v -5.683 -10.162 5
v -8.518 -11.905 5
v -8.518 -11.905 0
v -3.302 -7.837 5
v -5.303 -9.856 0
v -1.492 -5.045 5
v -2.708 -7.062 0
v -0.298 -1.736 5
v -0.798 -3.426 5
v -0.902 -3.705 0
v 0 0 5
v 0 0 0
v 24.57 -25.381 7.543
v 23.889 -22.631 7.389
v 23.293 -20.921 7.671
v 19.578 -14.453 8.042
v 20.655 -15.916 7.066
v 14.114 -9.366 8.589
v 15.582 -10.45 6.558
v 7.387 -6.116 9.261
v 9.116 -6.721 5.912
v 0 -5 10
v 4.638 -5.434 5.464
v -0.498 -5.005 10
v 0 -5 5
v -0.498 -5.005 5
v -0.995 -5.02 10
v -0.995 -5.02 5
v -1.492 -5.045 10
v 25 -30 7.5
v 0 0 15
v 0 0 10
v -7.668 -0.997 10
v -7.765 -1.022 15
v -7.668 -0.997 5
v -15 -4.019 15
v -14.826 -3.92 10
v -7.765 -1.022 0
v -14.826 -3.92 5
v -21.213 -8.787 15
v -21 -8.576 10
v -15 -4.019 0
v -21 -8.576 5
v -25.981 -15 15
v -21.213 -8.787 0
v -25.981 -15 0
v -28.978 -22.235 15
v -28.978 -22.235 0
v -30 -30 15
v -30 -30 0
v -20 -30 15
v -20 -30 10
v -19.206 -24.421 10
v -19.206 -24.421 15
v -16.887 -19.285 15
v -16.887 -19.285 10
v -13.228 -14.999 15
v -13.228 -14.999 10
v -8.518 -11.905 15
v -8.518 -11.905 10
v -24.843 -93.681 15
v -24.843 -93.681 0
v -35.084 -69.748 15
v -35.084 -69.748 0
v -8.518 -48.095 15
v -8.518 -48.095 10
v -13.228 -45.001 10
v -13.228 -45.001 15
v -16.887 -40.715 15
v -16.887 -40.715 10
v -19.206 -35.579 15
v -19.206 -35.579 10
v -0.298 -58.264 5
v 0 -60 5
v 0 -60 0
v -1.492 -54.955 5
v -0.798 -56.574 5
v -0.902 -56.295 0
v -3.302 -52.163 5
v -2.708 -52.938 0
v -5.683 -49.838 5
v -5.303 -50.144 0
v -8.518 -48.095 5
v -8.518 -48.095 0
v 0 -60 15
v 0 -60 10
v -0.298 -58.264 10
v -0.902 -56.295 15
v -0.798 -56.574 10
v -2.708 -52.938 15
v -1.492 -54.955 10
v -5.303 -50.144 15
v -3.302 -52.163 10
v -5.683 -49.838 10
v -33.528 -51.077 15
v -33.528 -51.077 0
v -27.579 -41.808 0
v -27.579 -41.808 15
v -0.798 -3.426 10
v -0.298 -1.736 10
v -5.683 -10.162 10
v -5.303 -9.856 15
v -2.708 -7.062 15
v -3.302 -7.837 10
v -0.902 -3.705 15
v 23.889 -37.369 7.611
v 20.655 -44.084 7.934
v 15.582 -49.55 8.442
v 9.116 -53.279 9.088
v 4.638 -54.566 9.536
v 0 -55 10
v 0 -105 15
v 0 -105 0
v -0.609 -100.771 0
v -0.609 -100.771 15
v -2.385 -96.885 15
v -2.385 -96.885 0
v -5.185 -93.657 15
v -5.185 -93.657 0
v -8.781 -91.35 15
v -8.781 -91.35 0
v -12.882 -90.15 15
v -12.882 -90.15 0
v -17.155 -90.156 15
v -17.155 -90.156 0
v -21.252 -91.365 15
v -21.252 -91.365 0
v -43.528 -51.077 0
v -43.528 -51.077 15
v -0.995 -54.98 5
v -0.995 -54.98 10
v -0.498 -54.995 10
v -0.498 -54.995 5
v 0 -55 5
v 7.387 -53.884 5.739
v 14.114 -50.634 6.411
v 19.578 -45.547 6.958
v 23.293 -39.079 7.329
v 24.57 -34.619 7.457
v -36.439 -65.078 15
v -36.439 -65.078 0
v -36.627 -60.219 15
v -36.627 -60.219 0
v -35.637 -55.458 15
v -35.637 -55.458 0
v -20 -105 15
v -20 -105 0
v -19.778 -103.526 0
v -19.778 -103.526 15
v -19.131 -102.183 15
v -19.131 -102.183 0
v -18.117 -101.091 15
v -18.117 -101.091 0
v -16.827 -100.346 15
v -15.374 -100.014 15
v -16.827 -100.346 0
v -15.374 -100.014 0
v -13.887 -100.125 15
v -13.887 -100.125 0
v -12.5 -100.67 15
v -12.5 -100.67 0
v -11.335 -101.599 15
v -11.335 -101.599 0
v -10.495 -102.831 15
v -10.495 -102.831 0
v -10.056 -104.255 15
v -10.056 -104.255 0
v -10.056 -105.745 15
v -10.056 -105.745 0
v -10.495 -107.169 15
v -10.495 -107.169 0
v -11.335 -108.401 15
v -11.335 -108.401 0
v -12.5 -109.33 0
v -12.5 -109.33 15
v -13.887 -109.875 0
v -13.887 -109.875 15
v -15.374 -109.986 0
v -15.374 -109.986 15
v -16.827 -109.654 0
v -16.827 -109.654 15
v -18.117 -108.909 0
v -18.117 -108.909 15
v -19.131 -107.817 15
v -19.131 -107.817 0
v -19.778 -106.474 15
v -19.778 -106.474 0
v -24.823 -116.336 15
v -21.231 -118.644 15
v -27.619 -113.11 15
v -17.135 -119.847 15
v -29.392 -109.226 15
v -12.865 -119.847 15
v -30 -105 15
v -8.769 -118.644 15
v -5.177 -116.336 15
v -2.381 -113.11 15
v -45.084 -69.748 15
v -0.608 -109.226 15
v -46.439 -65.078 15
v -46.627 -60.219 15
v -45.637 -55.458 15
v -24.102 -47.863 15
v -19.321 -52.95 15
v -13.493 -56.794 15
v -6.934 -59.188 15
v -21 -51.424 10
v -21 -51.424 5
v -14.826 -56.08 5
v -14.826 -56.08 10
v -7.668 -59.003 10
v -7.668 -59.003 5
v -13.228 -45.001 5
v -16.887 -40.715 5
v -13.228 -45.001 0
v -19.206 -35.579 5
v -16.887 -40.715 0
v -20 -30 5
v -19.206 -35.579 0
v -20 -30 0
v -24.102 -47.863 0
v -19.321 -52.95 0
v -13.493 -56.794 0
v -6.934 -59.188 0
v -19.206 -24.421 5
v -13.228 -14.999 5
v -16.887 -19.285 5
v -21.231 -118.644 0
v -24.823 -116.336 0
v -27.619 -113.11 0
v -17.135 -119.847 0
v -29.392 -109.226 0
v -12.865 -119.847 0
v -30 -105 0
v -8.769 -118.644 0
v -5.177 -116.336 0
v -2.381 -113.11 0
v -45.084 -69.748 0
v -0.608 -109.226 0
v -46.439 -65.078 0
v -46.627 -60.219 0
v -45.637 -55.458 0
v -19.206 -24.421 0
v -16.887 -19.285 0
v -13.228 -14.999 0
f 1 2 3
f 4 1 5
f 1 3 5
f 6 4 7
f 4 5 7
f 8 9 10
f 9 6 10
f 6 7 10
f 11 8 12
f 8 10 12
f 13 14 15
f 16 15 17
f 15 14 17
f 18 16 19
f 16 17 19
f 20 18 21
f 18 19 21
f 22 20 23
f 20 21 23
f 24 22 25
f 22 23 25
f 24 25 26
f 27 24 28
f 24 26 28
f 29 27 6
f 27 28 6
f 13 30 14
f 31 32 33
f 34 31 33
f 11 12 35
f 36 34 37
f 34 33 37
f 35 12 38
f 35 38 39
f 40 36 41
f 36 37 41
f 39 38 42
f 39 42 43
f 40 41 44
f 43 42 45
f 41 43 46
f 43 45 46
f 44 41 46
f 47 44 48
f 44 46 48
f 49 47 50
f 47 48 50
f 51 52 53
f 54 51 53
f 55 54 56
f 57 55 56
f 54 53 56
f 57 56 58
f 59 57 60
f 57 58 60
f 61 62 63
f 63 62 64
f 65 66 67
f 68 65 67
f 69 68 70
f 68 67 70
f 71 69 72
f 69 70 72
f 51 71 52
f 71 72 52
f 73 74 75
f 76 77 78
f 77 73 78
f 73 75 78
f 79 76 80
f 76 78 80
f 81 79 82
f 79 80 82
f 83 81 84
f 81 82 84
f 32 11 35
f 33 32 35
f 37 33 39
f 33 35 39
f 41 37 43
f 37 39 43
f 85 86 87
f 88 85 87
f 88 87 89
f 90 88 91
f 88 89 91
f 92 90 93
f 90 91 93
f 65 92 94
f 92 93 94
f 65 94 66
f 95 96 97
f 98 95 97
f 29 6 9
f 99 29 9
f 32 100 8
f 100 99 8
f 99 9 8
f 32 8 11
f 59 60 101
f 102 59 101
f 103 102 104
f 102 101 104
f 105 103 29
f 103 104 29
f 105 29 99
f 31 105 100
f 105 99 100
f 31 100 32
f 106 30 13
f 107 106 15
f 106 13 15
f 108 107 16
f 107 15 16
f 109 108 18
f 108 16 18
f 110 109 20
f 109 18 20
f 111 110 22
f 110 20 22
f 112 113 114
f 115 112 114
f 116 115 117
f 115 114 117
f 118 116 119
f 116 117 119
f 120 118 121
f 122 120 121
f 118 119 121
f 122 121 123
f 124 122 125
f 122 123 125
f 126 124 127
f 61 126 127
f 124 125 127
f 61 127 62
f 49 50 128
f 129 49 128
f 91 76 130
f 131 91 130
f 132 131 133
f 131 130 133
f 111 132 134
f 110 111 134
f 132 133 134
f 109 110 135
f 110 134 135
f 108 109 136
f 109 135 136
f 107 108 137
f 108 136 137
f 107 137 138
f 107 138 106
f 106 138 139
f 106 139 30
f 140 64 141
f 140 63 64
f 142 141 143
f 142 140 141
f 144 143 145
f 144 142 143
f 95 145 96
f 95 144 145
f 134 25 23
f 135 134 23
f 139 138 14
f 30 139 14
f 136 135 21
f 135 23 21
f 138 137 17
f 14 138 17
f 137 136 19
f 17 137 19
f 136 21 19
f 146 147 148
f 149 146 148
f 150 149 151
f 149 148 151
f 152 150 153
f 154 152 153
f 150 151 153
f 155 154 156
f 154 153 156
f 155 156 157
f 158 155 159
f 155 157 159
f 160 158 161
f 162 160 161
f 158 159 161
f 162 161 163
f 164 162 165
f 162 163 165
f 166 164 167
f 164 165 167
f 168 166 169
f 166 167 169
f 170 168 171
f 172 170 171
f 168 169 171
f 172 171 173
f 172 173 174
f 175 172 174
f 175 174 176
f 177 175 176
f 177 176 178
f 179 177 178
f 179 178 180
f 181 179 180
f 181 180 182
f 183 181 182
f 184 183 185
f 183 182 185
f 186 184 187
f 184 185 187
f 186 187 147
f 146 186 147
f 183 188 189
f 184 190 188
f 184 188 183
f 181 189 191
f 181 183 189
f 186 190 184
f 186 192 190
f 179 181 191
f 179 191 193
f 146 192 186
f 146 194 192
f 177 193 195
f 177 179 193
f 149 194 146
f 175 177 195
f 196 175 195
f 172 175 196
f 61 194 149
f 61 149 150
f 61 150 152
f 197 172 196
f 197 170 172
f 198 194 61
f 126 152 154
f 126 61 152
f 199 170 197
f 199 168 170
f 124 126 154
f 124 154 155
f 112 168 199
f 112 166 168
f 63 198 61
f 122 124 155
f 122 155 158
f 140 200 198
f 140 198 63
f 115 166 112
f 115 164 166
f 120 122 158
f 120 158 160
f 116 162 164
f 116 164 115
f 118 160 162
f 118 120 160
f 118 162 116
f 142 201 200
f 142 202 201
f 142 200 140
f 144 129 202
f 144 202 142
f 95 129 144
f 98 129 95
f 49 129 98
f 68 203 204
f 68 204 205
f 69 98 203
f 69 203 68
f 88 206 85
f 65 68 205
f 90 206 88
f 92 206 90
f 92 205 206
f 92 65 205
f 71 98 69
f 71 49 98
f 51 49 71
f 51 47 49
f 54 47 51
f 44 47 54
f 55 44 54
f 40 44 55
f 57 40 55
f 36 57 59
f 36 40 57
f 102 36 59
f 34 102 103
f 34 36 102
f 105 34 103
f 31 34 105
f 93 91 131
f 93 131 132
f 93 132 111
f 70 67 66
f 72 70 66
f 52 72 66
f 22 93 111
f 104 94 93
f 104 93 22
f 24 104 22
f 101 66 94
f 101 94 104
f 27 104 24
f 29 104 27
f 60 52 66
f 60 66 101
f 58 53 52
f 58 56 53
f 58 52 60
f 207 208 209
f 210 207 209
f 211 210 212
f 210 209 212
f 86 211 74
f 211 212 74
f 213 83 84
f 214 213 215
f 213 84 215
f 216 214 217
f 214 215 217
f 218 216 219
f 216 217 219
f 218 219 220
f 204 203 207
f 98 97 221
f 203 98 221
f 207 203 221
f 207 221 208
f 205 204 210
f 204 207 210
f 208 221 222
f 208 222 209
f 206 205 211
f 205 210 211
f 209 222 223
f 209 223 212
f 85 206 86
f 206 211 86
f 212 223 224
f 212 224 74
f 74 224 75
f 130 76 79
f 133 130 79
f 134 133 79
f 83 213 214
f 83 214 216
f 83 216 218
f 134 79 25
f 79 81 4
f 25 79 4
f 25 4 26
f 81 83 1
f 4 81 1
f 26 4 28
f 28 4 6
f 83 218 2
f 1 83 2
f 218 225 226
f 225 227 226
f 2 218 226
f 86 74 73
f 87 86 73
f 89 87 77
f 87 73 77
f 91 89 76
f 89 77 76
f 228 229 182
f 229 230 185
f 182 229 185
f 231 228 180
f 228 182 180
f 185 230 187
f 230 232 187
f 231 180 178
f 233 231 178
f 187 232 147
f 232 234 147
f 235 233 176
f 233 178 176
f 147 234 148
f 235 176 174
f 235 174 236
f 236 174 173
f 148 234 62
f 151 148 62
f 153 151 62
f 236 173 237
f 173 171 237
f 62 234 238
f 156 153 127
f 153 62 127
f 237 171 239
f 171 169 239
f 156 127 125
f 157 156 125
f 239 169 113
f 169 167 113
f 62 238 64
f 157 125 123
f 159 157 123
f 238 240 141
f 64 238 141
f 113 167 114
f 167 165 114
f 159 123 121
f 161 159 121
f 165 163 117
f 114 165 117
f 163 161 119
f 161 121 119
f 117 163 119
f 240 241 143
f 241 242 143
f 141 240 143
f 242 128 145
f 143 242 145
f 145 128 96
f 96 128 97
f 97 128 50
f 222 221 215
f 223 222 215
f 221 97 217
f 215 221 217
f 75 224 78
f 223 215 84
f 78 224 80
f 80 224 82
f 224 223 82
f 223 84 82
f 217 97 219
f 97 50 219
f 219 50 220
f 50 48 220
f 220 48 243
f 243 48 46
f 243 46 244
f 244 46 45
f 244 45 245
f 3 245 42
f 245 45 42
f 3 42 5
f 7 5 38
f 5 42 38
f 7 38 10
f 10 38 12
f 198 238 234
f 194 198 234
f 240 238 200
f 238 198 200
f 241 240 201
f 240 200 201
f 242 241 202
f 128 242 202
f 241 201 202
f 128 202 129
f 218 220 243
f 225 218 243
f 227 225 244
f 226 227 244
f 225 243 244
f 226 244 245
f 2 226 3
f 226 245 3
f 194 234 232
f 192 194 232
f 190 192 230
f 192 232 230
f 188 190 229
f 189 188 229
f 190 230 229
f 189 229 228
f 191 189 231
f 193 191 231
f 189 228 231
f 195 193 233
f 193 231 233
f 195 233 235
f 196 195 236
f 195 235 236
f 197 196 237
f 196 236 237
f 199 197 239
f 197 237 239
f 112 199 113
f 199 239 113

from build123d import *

# Parameters (mm, degrees)
BOSS_EXTRUDE1_DEPTH      = 15
FILLET1_R                = 20
FILLET2_R                = 15
BOSS_EXTRUDE2_DEPTH      = 25
BOSS_EXTRUDE2_DEPTH_BACK = 21
SKETCH2_W                = 5
SKETCH2_H                = 60
CUT_EXTRUDE1_DEPTH       = 5
CUT_EXTRUDE2_DEPTH       = 62


with BuildPart() as part:
    # Sketch1 → Boss-Extrude1 (new body)
    # profile 1 of 6: a face of its own
    with BuildSketch(Plane.XY):
        with BuildLine():
            Line((-20, -30), (-30, -30))
            ThreePointArc((-30, -30), (-29.388396861, -36.026784376), (-27.578524672, -41.807835403))
            Line((-27.578524672, -41.807835403), (-20, -30))
        make_face()
    # profile 2 of 6: a face of its own
    with BuildSketch(Plane.XY):
        with BuildLine():
            Line((0, -10), (0, 0))
            ThreePointArc((0, 0), (-21.213203436, -8.786796564), (-30, -30))
            Line((-30, -30), (-20, -30))
            ThreePointArc((-20, -30), (-14.142135624, -15.857864376), (0, -10))
        make_face()
    # profile 3 of 6: a face of its own
    with BuildSketch(Plane.XY):
        with BuildLine():
            ThreePointArc((0, -50), (-14.142135624, -44.142135624), (-20, -30))
            Line((-20, -30), (-27.578524672, -41.807835403))
            ThreePointArc((-27.578524672, -41.807835403), (-16.519154608, -55.04231481), (0, -60))
            Line((0, -60), (0, -50))
        make_face()
    # profile 4 of 6: a face of its own
    with BuildSketch(Plane.XY):
        with BuildLine():
            ThreePointArc((-27.578524672, -41.807835403), (-29.388396861, -36.026784376), (-30, -30))
            Line((-30, -30), (-49.254650189, -60))
            Line((-49.254650189, -60), (-30, -105))
            ThreePointArc((-30, -105), (-28.650020621, -98.780921528), (-24.84307506, -93.681260081))
            Line((-24.84307506, -93.681260081), (-39.254650189, -60))
            Line((-39.254650189, -60), (-27.578524672, -41.807835403))
        make_face()
    # profile 5 of 6: a face of its own
    with BuildSketch(Plane.XY):
        with BuildLine():
            ThreePointArc((-24.84307506, -93.681260081), (-28.650020621, -98.780921528), (-30, -105))
            Line((-30, -105), (-20, -105))
            Line((-20, -105), (-24.84307506, -93.681260081))
        make_face()
    # profile 6 of 6: a face of its own
    with BuildSketch(Plane.XY):
        with BuildLine():
            Line((-20, -105), (-30, -105))
            ThreePointArc((-30, -105), (-15, -120), (0, -105))
            ThreePointArc((0, -105), (-8.780921528, -91.349979379), (-24.84307506, -93.681260081))
            Line((-24.84307506, -93.681260081), (-20, -105))
        make_face()
        with BuildLine():
            ThreePointArc((-10, -105), (-15, -110), (-20, -105))
            ThreePointArc((-20, -105), (-15, -100), (-10, -105))
        make_face(mode=Mode.SUBTRACT)
    extrude(amount=BOSS_EXTRUDE1_DEPTH)

    # Fillet1
    fillet1_edges = [part.edges().sort_by_distance(p)[0] for p in [
        (-39.254650189, -60, 7.5),
        (-49.254650189, -60, 7.5),
    ]]
    fillet(fillet1_edges, radius=FILLET1_R)

    # Fillet2
    # the kernel refuses this fillet: 15 mm, written as the material it takes off along each edge
    with BuildSketch(Plane(origin=(0, -50, -25), x_dir=(-0.9759000729485309, 0.21821789023600283, 0), z_dir=(0, 0, 1))) as fillet2_piece_1:
        with BuildLine():
            CenterArc((12.001983963, 14.638501094), FILLET2_R, 198.983752857, 58.411864495)
            Line((-2.182178902, 9.759000729), (-2.46586216, 9.661410722))
            ThreePointArc((-2.46586216, 9.661410722), (-1.383859473, 4.814034998), (-0.292770022, -0.065465367))
            Line((-0.292770022, -0.065465367), (0.065465367, -0.292770022))
            ThreePointArc((0.065465367, -0.292770022), (4.364357805, 0.181998541), (8.663250242, -0.292770022))
            Line((8.663250242, -0.292770022), (8.728715609, 0))
        make_face()
    extrude(amount=65, mode=Mode.SUBTRACT)
    with BuildSketch(Plane(origin=(0, -10, -25), x_dir=(0, 1, 0), z_dir=(0, 0, 1))) as fillet2_piece_2:
        with BuildLine():
            CenterArc((11.666666667, 14.90711985), FILLET2_R, 205.208765297, 58.411864495)
            Line((-1.904761905, 8.5183542), (-2.176190476, 8.390578887))
            ThreePointArc((-2.176190476, 8.390578887), (-0.774768563, 4.298892438), (-0.3, 0))
            Line((-0.3, 0), (0, -0.3))
            ThreePointArc((0, -0.3), (5, -0.3), (9.966666667, -0.298142397))
            Line((9.966666667, -0.298142397), (10, 0))
        make_face()
    extrude(amount=65, mode=Mode.SUBTRACT)

    # Sketch2 → Boss-Extrude2 (add, two sides: drawn at the far end of the back side and taken through both)
    with BuildSketch(Plane(origin=(0, 0, 0), x_dir=(0, 0, -1), z_dir=(1, 0, 0)).offset(-BOSS_EXTRUDE2_DEPTH_BACK)):
        with Locations((-7.5, -30)):
            Rectangle(SKETCH2_W, SKETCH2_H)
    extrude(amount=BOSS_EXTRUDE2_DEPTH + BOSS_EXTRUDE2_DEPTH_BACK)

    # Sketch3 → Cut-Extrude1 (cut)
    with BuildSketch(Plane(origin=(0, 0, 5), x_dir=(-1, 0, 0), z_dir=(0, 0, -1))):
        with BuildLine():
            Line((0, 0), (-25, 0))
            Line((-25, 0), (-25, -30.000000042))
            ThreePointArc((-25, -30.000000042), (-17.141969276, -11.802393307), (1.49223119, -5.044574817))
            ThreePointArc((1.49223119, -5.044574817), (0.523240843, -2.588215791), (0, 0))
        make_face()
        with BuildLine():
            Line((21, 0), (0, 0))
            ThreePointArc((0, 0), (11.341768853, -2.226554422), (21, -8.575714714))
            Line((21, -8.575714714), (21, 0))
        make_face()
        with BuildLine():
            ThreePointArc((1.49223119, -54.955425183), (-17.141969245, -48.197606722), (-25, -30.000000042))
            Line((-25, -30.000000042), (-25, -60))
            Line((-25, -60), (0, -60))
            ThreePointArc((0, -60), (0.523240843, -57.411784209), (1.49223119, -54.955425183))
        make_face()
        with BuildLine():
            ThreePointArc((21, -51.424285286), (11.341768853, -57.773445578), (0, -60))
            Line((0, -60), (21, -60))
            Line((21, -60), (21, -51.424285286))
        make_face()
    extrude(amount=-CUT_EXTRUDE1_DEPTH, mode=Mode.SUBTRACT)

    # Sketch4 → Cut-Extrude2 (cut)
    with BuildSketch(Plane(origin=(0, 0, 0), x_dir=(1, 0, 0), z_dir=(0, 1, 0))):
        Polygon((0, -5), (25, -7.5), (25, -5), align=None)
        Polygon((25, -10), (25, -7.5), (0, -10), align=None)
    extrude(amount=-CUT_EXTRUDE2_DEPTH, mode=Mode.SUBTRACT)


solid = part.part
